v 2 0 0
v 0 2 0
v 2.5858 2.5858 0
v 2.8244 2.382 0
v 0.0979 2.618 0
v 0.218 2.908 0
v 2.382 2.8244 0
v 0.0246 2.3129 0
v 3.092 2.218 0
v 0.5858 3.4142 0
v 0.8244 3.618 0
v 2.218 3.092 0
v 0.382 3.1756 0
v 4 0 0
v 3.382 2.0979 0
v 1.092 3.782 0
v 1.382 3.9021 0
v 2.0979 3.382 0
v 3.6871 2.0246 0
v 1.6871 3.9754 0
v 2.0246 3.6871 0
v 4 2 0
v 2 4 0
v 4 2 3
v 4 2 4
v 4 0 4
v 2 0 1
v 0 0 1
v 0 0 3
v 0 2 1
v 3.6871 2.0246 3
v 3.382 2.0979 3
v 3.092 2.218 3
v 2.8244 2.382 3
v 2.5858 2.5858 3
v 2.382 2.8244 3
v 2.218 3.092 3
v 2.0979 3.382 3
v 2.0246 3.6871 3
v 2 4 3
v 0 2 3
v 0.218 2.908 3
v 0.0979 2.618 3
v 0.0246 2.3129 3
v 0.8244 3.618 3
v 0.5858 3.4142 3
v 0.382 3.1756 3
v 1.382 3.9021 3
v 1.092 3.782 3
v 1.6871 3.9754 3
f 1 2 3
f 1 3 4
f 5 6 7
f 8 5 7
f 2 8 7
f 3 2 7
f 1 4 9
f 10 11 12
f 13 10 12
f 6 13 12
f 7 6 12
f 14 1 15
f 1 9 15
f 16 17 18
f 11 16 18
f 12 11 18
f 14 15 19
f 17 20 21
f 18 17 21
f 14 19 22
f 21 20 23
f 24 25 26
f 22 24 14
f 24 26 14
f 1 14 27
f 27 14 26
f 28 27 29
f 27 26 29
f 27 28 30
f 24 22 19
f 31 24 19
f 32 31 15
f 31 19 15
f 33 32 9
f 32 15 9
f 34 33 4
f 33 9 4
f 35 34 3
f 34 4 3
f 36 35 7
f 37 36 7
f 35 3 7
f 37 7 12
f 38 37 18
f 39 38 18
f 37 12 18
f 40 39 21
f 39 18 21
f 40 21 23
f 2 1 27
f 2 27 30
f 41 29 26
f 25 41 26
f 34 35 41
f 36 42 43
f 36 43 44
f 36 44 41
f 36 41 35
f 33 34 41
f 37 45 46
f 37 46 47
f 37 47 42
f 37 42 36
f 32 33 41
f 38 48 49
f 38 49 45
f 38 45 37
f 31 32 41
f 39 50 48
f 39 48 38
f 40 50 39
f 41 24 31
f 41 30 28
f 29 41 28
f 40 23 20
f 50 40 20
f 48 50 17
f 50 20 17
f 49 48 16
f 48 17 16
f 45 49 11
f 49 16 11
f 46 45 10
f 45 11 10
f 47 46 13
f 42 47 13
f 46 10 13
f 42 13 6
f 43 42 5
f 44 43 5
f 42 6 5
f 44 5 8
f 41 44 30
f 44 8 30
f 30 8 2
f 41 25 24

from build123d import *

# Parameters (mm, degrees)
BOSS_EXTRUDE1_DEPTH = 3
BOSS_EXTRUDE2_DEPTH = 2
CUT_EXTRUDE1_DEPTH  = 1


with BuildPart() as part:
    # Sketch1 → Boss-Extrude1 (new body)
    with BuildSketch(Plane.XY):
        with BuildLine():
            Line((0, 0), (4, 0))
            Line((4, 0), (4, 2))
            ThreePointArc((4, 2), (2.585786438, 2.585786438), (2, 4))
            ThreePointArc((2, 4), (0.585786438, 3.414213562), (0, 2))
            Line((0, 2), (0, 0))
        make_face()
    extrude(amount=BOSS_EXTRUDE1_DEPTH)

    # Sketch2 → Boss-Extrude2 (add)
    with BuildSketch(Plane.XZ):
        Polygon((0, 3), (4, 4), (4, 3), align=None)
    extrude(amount=-BOSS_EXTRUDE2_DEPTH)

    # Sketch4 → Cut-Extrude1 (cut)
    with BuildSketch(Plane(origin=(0, 0, 0), x_dir=(-1, 0, 0), z_dir=(0, 0, -1))):
        Polygon((-2, 0), (0, 2), (0, 0), align=None)
    extrude(amount=-CUT_EXTRUDE1_DEPTH, mode=Mode.SUBTRACT)


solid = part.part
